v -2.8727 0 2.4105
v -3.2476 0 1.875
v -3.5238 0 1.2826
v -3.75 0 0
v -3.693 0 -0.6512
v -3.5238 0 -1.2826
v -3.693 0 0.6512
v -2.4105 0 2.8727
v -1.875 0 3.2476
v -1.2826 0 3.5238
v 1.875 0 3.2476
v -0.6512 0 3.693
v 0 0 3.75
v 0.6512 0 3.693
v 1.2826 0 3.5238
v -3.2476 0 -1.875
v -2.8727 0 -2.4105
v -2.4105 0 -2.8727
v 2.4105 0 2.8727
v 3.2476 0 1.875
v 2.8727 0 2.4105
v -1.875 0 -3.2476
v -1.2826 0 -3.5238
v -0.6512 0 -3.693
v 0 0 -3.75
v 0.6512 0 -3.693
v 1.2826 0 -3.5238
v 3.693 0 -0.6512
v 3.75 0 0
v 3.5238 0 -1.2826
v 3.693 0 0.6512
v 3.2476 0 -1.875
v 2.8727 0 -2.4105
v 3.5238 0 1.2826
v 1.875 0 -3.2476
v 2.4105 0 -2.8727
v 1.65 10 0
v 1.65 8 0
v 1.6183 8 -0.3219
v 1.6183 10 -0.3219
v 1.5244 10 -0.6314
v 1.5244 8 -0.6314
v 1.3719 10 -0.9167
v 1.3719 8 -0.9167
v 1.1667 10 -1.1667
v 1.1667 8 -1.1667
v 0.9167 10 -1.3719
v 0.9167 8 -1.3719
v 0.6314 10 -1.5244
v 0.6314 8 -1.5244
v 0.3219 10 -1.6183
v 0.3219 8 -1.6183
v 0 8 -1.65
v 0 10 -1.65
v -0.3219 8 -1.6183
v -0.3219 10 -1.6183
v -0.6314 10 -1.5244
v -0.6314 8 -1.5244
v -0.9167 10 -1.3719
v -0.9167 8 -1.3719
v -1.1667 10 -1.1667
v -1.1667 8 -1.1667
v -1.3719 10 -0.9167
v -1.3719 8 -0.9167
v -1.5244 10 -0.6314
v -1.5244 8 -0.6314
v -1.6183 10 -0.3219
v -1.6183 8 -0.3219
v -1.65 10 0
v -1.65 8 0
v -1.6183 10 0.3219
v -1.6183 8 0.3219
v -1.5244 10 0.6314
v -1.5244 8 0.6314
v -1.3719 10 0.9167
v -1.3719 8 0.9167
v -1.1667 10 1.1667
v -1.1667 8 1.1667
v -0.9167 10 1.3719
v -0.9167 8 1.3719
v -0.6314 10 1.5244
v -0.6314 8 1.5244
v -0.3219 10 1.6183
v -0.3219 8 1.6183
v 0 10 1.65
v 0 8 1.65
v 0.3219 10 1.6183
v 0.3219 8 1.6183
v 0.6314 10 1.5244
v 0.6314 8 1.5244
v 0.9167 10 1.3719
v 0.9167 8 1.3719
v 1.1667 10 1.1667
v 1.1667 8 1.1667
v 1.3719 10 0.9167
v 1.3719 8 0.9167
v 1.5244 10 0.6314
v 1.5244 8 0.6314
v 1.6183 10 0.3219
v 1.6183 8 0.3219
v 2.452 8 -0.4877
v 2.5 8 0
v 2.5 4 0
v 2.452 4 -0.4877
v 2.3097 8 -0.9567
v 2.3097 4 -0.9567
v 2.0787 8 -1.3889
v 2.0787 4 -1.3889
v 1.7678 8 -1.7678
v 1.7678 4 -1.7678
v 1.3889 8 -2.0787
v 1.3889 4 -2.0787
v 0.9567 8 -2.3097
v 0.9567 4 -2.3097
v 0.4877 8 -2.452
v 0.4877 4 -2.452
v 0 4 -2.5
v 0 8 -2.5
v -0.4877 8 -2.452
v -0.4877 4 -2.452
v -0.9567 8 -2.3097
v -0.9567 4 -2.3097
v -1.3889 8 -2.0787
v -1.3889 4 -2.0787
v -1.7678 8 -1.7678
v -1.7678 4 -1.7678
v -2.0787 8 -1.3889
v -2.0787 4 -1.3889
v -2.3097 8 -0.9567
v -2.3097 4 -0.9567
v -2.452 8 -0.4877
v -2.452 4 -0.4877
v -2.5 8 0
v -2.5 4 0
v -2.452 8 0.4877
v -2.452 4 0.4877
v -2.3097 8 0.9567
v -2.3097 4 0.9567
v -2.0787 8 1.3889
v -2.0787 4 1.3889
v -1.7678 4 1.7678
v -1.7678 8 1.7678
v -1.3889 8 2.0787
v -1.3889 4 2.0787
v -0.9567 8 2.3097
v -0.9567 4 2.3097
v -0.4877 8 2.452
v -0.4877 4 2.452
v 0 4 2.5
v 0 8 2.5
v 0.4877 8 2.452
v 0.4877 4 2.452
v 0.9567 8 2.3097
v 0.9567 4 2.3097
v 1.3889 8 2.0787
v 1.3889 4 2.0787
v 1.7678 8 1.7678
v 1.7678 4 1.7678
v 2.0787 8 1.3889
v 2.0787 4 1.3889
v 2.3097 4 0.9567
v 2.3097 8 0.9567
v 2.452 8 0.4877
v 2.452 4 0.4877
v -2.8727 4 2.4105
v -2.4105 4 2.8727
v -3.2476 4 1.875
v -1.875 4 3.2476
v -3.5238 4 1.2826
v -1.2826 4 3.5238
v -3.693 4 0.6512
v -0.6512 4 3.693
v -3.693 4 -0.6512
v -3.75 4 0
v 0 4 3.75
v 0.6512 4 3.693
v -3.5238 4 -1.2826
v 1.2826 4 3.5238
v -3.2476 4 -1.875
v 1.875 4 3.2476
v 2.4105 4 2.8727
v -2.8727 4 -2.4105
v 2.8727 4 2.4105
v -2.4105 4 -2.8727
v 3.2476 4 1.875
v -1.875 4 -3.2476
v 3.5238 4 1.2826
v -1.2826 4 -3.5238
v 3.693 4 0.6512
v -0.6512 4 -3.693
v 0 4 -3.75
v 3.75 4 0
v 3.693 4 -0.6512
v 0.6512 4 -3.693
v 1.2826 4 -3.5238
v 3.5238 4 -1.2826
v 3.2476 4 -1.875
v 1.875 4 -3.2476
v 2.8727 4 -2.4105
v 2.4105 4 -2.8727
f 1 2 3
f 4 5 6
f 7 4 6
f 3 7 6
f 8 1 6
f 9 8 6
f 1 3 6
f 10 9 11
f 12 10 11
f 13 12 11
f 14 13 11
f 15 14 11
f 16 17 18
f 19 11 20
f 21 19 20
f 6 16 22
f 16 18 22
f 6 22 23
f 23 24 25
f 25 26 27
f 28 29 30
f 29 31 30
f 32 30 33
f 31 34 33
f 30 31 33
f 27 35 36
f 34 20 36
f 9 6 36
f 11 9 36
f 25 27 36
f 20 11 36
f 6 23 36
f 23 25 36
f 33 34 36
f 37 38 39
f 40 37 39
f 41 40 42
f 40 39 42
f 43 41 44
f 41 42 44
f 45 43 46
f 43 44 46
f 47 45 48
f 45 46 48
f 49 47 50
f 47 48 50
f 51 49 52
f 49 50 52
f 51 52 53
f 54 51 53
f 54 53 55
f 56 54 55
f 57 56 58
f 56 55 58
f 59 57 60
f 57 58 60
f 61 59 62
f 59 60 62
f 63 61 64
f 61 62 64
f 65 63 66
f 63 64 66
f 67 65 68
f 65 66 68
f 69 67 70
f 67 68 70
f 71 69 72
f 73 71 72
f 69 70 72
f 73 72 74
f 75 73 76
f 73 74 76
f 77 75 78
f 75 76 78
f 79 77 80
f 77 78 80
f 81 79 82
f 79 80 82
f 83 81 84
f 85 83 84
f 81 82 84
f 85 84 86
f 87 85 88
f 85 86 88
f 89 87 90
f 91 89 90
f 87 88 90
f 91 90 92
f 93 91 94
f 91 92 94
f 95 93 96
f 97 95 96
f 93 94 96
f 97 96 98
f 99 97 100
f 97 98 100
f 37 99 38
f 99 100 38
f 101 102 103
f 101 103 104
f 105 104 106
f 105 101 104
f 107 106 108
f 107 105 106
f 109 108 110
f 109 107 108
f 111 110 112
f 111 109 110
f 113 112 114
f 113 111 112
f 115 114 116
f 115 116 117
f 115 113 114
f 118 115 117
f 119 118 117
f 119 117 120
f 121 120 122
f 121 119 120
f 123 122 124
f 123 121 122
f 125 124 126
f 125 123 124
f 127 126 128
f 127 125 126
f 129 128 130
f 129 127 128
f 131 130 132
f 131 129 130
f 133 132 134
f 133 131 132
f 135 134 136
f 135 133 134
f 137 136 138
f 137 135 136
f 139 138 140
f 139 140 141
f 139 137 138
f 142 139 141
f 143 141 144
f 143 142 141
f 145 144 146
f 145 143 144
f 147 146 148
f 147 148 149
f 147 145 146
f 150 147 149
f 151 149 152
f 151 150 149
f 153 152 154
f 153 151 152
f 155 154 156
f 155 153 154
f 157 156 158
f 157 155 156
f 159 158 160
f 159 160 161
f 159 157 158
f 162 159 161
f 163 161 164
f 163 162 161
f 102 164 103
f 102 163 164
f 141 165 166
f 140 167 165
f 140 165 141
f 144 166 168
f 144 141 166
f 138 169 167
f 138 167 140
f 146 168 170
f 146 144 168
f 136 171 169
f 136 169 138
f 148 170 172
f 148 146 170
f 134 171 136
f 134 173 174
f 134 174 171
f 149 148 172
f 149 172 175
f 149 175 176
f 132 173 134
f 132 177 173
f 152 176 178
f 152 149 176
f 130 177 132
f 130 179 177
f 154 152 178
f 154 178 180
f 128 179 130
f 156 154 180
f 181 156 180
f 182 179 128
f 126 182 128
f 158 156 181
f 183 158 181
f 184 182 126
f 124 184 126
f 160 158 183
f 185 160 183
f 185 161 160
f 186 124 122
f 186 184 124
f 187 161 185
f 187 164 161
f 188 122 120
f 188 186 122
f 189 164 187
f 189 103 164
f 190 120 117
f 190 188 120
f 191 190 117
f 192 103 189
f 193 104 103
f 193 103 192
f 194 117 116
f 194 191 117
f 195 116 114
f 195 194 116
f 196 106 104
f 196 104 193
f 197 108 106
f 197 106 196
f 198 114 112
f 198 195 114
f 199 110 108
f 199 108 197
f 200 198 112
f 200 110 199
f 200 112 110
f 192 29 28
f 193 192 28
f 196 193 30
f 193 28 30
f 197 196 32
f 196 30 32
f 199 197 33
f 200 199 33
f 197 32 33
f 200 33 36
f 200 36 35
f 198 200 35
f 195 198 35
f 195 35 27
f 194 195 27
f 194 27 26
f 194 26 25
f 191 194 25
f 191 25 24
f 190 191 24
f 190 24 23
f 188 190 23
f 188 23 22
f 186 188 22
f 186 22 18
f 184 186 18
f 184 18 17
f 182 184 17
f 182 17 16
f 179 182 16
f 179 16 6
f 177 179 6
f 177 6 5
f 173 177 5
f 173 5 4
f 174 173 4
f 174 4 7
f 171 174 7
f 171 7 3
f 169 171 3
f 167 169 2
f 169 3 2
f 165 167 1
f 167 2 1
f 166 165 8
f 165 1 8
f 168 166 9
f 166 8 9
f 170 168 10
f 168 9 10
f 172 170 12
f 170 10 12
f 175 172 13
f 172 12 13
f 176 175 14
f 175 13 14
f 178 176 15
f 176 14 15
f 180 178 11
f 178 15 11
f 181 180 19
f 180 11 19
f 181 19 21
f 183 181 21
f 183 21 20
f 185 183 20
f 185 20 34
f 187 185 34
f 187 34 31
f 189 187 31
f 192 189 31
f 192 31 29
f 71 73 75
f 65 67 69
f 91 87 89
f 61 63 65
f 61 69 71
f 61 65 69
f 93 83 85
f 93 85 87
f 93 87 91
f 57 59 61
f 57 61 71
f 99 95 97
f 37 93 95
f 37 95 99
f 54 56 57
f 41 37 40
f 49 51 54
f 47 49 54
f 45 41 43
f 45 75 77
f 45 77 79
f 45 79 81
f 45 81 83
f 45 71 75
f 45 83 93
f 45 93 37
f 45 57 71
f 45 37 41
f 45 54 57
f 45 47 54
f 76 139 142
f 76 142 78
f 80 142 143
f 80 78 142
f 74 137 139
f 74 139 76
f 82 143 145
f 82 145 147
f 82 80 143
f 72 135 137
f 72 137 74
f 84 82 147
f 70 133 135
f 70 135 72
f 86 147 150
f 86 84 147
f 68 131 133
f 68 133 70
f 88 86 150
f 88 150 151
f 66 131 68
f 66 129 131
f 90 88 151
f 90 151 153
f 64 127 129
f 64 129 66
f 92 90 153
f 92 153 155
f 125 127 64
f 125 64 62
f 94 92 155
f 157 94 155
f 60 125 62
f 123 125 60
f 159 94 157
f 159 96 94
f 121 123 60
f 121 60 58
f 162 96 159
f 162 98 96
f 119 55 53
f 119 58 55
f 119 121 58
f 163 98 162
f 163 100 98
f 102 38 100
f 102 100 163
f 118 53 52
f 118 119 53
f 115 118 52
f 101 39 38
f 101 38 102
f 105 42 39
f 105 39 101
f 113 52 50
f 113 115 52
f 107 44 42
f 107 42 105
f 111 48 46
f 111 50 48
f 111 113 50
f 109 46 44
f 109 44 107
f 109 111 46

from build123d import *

# Parameters (mm, degrees)
SKETCH1_R           = 3.75
BOSS_EXTRUDE1_DEPTH = 8
SKETCH2_R           = 3.75
SKETCH2_R_2         = 2.5
CUT_EXTRUDE1_DEPTH  = 4
SKETCH3_R           = 1.65
BOSS_EXTRUDE2_DEPTH = 2


with BuildPart() as part:
    # Sketch1 → Boss-Extrude1 (new body)
    with BuildSketch(Plane(origin=(0, 0, 0), x_dir=(1, 0, 0), z_dir=(0, 1, 0))):
        Circle(SKETCH1_R)
    extrude(amount=BOSS_EXTRUDE1_DEPTH)

    # Sketch2 → Cut-Extrude1 (cut)
    with BuildSketch(Plane(origin=(0, 8, 0), x_dir=(1, 0, 0), z_dir=(0, 1, 0))):
        Circle(SKETCH2_R)
        Circle(SKETCH2_R_2, mode=Mode.SUBTRACT)
    extrude(amount=-CUT_EXTRUDE1_DEPTH, mode=Mode.SUBTRACT)

    # Sketch3 → Boss-Extrude2 (add)
    with BuildSketch(Plane(origin=(0, 8, 0), x_dir=(1, 0, 0), z_dir=(0, 1, 0))):
        Circle(SKETCH3_R)
    extrude(amount=BOSS_EXTRUDE2_DEPTH)


solid = part.part
